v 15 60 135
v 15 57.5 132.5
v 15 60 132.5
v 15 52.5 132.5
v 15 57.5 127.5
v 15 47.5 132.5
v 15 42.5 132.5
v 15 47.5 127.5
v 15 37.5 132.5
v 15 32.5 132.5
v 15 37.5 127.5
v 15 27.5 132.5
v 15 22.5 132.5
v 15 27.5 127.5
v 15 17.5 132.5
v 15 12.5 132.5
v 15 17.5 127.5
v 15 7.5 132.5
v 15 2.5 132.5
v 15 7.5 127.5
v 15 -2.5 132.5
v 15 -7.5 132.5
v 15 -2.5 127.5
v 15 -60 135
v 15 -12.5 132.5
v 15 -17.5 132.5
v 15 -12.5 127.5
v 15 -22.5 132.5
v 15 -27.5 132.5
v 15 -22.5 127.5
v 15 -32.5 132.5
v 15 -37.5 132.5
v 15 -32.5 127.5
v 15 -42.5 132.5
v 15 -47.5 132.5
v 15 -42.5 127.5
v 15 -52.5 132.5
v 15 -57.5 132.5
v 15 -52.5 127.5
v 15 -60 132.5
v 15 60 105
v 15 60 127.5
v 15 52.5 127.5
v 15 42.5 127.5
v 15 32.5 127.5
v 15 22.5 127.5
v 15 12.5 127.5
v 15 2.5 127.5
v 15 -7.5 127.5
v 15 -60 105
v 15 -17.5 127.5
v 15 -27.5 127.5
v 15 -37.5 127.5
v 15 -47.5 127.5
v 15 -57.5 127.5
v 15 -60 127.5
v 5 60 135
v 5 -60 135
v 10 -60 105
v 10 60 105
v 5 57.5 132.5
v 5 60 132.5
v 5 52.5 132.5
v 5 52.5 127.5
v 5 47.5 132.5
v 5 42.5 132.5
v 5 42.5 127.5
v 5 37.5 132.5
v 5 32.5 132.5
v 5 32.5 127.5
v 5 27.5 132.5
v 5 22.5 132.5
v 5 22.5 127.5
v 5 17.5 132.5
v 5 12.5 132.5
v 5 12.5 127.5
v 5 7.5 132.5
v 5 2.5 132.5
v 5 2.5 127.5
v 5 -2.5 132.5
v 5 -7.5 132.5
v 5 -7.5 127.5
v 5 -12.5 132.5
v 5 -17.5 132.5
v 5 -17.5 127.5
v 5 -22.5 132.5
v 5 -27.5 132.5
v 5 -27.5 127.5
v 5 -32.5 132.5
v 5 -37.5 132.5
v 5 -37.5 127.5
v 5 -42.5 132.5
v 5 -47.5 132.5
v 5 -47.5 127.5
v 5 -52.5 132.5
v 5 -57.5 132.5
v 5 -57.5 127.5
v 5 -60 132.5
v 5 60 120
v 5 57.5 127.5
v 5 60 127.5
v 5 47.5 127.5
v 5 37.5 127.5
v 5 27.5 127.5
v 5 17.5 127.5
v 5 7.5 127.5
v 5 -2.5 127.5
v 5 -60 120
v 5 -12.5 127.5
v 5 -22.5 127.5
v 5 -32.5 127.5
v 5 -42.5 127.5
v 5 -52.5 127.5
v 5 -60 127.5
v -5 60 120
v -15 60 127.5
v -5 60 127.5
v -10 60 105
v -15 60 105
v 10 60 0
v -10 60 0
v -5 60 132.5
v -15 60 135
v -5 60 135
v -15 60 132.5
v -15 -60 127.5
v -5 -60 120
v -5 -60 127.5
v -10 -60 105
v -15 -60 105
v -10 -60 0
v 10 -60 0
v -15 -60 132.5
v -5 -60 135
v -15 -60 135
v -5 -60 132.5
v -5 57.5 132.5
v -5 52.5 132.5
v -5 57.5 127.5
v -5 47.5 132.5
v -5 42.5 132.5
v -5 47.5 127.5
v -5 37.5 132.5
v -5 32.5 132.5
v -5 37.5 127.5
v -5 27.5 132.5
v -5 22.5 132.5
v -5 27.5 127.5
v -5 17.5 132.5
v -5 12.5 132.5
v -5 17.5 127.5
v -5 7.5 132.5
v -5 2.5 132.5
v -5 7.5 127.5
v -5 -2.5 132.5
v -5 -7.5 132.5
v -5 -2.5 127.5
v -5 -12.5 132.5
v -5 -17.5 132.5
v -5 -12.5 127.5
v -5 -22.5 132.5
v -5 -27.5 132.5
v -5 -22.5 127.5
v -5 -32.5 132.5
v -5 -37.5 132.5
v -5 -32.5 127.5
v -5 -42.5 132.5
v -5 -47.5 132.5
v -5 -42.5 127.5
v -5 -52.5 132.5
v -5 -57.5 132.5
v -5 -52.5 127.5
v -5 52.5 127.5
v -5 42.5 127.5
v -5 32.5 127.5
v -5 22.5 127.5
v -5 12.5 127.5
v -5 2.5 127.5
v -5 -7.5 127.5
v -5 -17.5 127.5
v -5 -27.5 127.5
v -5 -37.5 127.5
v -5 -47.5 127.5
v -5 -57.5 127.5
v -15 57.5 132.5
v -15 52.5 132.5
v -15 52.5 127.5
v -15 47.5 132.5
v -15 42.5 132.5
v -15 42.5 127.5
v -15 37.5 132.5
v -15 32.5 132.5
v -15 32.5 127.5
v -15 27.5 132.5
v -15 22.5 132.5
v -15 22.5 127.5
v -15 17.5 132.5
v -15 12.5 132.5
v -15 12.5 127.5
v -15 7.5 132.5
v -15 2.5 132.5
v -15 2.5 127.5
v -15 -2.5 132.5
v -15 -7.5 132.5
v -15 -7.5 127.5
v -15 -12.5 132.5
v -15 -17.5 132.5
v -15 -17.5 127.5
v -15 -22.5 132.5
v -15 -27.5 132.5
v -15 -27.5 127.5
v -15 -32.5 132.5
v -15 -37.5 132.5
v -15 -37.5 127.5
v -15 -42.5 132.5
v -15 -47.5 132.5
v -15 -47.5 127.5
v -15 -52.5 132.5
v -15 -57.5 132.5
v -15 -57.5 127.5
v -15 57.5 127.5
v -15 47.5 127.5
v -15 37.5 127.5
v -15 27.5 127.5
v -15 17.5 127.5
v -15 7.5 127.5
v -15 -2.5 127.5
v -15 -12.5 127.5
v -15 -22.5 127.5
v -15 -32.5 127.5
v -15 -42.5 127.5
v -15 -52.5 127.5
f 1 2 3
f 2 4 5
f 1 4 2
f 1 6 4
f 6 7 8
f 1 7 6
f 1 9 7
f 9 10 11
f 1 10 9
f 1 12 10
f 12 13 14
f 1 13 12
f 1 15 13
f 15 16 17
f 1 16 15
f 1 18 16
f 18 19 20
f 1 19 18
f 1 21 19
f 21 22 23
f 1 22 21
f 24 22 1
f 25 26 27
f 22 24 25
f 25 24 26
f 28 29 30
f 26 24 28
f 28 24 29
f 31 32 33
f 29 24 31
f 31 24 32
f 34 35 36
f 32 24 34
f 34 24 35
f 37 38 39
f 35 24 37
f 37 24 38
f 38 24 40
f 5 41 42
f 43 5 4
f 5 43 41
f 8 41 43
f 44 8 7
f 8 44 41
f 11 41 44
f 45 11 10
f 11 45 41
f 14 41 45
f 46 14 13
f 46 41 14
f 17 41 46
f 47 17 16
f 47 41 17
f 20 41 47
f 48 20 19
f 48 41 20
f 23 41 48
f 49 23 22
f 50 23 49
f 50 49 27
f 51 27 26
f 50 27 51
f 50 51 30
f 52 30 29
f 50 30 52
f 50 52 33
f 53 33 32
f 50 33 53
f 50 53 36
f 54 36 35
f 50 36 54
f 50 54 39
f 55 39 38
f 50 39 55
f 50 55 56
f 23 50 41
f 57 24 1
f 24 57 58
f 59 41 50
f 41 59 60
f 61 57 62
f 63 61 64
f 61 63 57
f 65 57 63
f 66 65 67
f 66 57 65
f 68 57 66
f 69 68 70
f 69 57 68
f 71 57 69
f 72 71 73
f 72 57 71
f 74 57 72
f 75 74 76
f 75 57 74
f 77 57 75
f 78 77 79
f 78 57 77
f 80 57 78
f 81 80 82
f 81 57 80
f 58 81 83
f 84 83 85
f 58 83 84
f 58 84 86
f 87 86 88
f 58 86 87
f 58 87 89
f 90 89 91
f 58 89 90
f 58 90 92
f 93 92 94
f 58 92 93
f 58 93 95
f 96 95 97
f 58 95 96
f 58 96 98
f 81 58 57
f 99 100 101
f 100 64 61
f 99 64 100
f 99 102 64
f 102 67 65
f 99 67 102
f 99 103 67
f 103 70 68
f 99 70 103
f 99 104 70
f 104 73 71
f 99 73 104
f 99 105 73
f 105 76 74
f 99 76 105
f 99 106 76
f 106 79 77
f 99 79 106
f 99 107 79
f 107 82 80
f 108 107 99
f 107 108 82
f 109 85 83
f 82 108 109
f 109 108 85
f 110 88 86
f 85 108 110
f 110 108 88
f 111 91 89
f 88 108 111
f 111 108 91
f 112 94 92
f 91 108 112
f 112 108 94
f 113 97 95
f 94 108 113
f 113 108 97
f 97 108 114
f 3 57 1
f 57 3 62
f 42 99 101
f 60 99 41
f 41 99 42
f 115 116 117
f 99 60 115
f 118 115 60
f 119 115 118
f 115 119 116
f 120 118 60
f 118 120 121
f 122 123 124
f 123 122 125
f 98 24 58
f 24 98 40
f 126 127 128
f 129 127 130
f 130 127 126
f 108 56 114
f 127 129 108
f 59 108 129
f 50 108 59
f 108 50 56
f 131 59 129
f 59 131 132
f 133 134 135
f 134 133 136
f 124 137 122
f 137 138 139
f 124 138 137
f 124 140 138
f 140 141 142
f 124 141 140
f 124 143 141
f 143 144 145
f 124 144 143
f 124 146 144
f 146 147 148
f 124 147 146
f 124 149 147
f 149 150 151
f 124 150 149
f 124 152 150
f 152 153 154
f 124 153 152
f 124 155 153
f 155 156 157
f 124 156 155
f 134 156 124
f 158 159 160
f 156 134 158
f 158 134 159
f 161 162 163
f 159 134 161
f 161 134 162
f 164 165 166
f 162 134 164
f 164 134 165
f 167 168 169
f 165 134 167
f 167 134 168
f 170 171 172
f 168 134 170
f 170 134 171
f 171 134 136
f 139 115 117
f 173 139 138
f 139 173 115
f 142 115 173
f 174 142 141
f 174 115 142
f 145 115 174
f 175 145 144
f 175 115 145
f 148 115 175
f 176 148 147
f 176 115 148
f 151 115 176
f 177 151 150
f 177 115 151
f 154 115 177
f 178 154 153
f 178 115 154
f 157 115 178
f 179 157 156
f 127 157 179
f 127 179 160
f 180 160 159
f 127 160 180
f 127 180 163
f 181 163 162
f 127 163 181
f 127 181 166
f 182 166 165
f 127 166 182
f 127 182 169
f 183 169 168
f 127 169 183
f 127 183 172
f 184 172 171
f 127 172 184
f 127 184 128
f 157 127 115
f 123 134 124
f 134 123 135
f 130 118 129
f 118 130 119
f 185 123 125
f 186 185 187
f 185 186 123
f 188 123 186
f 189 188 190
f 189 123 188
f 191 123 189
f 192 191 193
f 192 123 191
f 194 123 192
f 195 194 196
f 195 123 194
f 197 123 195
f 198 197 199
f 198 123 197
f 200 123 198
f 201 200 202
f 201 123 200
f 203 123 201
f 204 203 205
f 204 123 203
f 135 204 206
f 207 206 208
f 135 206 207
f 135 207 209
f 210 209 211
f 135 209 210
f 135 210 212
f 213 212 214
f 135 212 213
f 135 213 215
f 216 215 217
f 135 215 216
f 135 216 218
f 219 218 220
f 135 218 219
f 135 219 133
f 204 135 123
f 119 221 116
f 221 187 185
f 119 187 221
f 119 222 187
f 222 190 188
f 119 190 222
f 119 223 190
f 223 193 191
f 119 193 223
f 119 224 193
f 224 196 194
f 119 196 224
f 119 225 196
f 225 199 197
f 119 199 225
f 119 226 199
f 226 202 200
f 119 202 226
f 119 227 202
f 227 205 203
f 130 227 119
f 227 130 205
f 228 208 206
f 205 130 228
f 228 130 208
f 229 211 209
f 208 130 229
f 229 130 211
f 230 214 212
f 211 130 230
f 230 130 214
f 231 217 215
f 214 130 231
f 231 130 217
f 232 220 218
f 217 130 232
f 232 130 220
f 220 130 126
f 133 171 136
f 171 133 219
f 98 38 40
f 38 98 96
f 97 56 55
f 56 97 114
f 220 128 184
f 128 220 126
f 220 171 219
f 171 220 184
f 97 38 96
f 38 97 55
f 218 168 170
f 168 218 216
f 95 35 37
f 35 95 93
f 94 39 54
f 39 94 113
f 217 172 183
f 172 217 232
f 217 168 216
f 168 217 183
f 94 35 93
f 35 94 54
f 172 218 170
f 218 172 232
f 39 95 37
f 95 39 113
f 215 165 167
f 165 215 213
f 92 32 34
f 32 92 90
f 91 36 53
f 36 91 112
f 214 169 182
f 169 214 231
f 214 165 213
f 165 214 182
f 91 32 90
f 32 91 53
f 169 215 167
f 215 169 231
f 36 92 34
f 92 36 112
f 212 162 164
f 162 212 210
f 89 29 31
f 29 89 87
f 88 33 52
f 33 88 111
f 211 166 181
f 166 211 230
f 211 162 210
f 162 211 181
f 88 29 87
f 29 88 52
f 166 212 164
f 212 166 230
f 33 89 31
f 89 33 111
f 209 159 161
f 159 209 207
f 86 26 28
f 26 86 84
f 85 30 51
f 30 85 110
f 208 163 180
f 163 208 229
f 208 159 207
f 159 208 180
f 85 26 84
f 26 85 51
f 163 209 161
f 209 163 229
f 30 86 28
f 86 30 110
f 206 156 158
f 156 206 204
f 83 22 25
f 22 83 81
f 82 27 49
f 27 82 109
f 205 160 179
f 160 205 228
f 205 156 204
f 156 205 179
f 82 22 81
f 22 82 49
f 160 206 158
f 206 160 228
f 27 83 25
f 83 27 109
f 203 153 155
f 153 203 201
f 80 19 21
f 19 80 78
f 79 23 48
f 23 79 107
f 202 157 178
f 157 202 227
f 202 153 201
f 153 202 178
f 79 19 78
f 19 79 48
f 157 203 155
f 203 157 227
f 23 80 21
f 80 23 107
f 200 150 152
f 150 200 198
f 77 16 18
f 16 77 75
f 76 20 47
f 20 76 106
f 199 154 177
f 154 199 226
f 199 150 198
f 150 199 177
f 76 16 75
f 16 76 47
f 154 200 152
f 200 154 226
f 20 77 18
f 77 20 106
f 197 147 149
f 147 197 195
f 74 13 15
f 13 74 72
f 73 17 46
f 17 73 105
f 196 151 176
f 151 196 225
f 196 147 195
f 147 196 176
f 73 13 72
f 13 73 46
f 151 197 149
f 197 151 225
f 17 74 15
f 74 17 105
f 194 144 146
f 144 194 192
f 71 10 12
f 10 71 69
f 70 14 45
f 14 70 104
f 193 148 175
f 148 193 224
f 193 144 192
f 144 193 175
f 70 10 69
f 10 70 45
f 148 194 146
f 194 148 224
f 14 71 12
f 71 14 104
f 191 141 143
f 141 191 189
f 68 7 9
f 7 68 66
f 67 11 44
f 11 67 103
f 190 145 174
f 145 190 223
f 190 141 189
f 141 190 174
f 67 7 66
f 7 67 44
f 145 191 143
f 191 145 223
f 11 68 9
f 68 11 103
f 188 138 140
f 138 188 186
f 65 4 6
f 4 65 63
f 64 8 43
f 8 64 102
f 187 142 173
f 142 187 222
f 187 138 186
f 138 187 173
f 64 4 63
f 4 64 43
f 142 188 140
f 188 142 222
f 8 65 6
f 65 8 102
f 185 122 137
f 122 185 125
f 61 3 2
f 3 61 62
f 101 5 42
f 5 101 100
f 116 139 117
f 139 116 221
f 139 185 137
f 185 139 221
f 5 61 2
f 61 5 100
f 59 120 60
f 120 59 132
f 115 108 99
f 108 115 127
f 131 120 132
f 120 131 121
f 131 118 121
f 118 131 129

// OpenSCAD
castle(20,120,120);

module castle(thick, height, length)
{
    wall(thick, height,length);
    //translate([length-thick,0,0])wall(thick, height,length);
    //translate([-110,0,0])wall(thick, height,length);
    //translate([0,110,0])rotate(90) wall(thick, height,length);
    //translate([0,-110,0])rotate(90) wall(thick, height,length);
    
}

module wall(thick, height, length)
{
    for(i=[0:length/40])
    {
        translate([0,0,height/2]) cube([thick,length,height],true);
    
        difference() 
        {
            union()
            {
                translate([thick/2,0,height]) cube([thick/2, length, 30],true);    
                translate([-thick/2,0,height]) cube([thick/2, length, 30],true);
            }
            for(i=[0:length/10])
                translate([0,-length/2+i*2*5,height+10]) cube([thick*1.5,5,5],true);    
        }   
    }    
}
